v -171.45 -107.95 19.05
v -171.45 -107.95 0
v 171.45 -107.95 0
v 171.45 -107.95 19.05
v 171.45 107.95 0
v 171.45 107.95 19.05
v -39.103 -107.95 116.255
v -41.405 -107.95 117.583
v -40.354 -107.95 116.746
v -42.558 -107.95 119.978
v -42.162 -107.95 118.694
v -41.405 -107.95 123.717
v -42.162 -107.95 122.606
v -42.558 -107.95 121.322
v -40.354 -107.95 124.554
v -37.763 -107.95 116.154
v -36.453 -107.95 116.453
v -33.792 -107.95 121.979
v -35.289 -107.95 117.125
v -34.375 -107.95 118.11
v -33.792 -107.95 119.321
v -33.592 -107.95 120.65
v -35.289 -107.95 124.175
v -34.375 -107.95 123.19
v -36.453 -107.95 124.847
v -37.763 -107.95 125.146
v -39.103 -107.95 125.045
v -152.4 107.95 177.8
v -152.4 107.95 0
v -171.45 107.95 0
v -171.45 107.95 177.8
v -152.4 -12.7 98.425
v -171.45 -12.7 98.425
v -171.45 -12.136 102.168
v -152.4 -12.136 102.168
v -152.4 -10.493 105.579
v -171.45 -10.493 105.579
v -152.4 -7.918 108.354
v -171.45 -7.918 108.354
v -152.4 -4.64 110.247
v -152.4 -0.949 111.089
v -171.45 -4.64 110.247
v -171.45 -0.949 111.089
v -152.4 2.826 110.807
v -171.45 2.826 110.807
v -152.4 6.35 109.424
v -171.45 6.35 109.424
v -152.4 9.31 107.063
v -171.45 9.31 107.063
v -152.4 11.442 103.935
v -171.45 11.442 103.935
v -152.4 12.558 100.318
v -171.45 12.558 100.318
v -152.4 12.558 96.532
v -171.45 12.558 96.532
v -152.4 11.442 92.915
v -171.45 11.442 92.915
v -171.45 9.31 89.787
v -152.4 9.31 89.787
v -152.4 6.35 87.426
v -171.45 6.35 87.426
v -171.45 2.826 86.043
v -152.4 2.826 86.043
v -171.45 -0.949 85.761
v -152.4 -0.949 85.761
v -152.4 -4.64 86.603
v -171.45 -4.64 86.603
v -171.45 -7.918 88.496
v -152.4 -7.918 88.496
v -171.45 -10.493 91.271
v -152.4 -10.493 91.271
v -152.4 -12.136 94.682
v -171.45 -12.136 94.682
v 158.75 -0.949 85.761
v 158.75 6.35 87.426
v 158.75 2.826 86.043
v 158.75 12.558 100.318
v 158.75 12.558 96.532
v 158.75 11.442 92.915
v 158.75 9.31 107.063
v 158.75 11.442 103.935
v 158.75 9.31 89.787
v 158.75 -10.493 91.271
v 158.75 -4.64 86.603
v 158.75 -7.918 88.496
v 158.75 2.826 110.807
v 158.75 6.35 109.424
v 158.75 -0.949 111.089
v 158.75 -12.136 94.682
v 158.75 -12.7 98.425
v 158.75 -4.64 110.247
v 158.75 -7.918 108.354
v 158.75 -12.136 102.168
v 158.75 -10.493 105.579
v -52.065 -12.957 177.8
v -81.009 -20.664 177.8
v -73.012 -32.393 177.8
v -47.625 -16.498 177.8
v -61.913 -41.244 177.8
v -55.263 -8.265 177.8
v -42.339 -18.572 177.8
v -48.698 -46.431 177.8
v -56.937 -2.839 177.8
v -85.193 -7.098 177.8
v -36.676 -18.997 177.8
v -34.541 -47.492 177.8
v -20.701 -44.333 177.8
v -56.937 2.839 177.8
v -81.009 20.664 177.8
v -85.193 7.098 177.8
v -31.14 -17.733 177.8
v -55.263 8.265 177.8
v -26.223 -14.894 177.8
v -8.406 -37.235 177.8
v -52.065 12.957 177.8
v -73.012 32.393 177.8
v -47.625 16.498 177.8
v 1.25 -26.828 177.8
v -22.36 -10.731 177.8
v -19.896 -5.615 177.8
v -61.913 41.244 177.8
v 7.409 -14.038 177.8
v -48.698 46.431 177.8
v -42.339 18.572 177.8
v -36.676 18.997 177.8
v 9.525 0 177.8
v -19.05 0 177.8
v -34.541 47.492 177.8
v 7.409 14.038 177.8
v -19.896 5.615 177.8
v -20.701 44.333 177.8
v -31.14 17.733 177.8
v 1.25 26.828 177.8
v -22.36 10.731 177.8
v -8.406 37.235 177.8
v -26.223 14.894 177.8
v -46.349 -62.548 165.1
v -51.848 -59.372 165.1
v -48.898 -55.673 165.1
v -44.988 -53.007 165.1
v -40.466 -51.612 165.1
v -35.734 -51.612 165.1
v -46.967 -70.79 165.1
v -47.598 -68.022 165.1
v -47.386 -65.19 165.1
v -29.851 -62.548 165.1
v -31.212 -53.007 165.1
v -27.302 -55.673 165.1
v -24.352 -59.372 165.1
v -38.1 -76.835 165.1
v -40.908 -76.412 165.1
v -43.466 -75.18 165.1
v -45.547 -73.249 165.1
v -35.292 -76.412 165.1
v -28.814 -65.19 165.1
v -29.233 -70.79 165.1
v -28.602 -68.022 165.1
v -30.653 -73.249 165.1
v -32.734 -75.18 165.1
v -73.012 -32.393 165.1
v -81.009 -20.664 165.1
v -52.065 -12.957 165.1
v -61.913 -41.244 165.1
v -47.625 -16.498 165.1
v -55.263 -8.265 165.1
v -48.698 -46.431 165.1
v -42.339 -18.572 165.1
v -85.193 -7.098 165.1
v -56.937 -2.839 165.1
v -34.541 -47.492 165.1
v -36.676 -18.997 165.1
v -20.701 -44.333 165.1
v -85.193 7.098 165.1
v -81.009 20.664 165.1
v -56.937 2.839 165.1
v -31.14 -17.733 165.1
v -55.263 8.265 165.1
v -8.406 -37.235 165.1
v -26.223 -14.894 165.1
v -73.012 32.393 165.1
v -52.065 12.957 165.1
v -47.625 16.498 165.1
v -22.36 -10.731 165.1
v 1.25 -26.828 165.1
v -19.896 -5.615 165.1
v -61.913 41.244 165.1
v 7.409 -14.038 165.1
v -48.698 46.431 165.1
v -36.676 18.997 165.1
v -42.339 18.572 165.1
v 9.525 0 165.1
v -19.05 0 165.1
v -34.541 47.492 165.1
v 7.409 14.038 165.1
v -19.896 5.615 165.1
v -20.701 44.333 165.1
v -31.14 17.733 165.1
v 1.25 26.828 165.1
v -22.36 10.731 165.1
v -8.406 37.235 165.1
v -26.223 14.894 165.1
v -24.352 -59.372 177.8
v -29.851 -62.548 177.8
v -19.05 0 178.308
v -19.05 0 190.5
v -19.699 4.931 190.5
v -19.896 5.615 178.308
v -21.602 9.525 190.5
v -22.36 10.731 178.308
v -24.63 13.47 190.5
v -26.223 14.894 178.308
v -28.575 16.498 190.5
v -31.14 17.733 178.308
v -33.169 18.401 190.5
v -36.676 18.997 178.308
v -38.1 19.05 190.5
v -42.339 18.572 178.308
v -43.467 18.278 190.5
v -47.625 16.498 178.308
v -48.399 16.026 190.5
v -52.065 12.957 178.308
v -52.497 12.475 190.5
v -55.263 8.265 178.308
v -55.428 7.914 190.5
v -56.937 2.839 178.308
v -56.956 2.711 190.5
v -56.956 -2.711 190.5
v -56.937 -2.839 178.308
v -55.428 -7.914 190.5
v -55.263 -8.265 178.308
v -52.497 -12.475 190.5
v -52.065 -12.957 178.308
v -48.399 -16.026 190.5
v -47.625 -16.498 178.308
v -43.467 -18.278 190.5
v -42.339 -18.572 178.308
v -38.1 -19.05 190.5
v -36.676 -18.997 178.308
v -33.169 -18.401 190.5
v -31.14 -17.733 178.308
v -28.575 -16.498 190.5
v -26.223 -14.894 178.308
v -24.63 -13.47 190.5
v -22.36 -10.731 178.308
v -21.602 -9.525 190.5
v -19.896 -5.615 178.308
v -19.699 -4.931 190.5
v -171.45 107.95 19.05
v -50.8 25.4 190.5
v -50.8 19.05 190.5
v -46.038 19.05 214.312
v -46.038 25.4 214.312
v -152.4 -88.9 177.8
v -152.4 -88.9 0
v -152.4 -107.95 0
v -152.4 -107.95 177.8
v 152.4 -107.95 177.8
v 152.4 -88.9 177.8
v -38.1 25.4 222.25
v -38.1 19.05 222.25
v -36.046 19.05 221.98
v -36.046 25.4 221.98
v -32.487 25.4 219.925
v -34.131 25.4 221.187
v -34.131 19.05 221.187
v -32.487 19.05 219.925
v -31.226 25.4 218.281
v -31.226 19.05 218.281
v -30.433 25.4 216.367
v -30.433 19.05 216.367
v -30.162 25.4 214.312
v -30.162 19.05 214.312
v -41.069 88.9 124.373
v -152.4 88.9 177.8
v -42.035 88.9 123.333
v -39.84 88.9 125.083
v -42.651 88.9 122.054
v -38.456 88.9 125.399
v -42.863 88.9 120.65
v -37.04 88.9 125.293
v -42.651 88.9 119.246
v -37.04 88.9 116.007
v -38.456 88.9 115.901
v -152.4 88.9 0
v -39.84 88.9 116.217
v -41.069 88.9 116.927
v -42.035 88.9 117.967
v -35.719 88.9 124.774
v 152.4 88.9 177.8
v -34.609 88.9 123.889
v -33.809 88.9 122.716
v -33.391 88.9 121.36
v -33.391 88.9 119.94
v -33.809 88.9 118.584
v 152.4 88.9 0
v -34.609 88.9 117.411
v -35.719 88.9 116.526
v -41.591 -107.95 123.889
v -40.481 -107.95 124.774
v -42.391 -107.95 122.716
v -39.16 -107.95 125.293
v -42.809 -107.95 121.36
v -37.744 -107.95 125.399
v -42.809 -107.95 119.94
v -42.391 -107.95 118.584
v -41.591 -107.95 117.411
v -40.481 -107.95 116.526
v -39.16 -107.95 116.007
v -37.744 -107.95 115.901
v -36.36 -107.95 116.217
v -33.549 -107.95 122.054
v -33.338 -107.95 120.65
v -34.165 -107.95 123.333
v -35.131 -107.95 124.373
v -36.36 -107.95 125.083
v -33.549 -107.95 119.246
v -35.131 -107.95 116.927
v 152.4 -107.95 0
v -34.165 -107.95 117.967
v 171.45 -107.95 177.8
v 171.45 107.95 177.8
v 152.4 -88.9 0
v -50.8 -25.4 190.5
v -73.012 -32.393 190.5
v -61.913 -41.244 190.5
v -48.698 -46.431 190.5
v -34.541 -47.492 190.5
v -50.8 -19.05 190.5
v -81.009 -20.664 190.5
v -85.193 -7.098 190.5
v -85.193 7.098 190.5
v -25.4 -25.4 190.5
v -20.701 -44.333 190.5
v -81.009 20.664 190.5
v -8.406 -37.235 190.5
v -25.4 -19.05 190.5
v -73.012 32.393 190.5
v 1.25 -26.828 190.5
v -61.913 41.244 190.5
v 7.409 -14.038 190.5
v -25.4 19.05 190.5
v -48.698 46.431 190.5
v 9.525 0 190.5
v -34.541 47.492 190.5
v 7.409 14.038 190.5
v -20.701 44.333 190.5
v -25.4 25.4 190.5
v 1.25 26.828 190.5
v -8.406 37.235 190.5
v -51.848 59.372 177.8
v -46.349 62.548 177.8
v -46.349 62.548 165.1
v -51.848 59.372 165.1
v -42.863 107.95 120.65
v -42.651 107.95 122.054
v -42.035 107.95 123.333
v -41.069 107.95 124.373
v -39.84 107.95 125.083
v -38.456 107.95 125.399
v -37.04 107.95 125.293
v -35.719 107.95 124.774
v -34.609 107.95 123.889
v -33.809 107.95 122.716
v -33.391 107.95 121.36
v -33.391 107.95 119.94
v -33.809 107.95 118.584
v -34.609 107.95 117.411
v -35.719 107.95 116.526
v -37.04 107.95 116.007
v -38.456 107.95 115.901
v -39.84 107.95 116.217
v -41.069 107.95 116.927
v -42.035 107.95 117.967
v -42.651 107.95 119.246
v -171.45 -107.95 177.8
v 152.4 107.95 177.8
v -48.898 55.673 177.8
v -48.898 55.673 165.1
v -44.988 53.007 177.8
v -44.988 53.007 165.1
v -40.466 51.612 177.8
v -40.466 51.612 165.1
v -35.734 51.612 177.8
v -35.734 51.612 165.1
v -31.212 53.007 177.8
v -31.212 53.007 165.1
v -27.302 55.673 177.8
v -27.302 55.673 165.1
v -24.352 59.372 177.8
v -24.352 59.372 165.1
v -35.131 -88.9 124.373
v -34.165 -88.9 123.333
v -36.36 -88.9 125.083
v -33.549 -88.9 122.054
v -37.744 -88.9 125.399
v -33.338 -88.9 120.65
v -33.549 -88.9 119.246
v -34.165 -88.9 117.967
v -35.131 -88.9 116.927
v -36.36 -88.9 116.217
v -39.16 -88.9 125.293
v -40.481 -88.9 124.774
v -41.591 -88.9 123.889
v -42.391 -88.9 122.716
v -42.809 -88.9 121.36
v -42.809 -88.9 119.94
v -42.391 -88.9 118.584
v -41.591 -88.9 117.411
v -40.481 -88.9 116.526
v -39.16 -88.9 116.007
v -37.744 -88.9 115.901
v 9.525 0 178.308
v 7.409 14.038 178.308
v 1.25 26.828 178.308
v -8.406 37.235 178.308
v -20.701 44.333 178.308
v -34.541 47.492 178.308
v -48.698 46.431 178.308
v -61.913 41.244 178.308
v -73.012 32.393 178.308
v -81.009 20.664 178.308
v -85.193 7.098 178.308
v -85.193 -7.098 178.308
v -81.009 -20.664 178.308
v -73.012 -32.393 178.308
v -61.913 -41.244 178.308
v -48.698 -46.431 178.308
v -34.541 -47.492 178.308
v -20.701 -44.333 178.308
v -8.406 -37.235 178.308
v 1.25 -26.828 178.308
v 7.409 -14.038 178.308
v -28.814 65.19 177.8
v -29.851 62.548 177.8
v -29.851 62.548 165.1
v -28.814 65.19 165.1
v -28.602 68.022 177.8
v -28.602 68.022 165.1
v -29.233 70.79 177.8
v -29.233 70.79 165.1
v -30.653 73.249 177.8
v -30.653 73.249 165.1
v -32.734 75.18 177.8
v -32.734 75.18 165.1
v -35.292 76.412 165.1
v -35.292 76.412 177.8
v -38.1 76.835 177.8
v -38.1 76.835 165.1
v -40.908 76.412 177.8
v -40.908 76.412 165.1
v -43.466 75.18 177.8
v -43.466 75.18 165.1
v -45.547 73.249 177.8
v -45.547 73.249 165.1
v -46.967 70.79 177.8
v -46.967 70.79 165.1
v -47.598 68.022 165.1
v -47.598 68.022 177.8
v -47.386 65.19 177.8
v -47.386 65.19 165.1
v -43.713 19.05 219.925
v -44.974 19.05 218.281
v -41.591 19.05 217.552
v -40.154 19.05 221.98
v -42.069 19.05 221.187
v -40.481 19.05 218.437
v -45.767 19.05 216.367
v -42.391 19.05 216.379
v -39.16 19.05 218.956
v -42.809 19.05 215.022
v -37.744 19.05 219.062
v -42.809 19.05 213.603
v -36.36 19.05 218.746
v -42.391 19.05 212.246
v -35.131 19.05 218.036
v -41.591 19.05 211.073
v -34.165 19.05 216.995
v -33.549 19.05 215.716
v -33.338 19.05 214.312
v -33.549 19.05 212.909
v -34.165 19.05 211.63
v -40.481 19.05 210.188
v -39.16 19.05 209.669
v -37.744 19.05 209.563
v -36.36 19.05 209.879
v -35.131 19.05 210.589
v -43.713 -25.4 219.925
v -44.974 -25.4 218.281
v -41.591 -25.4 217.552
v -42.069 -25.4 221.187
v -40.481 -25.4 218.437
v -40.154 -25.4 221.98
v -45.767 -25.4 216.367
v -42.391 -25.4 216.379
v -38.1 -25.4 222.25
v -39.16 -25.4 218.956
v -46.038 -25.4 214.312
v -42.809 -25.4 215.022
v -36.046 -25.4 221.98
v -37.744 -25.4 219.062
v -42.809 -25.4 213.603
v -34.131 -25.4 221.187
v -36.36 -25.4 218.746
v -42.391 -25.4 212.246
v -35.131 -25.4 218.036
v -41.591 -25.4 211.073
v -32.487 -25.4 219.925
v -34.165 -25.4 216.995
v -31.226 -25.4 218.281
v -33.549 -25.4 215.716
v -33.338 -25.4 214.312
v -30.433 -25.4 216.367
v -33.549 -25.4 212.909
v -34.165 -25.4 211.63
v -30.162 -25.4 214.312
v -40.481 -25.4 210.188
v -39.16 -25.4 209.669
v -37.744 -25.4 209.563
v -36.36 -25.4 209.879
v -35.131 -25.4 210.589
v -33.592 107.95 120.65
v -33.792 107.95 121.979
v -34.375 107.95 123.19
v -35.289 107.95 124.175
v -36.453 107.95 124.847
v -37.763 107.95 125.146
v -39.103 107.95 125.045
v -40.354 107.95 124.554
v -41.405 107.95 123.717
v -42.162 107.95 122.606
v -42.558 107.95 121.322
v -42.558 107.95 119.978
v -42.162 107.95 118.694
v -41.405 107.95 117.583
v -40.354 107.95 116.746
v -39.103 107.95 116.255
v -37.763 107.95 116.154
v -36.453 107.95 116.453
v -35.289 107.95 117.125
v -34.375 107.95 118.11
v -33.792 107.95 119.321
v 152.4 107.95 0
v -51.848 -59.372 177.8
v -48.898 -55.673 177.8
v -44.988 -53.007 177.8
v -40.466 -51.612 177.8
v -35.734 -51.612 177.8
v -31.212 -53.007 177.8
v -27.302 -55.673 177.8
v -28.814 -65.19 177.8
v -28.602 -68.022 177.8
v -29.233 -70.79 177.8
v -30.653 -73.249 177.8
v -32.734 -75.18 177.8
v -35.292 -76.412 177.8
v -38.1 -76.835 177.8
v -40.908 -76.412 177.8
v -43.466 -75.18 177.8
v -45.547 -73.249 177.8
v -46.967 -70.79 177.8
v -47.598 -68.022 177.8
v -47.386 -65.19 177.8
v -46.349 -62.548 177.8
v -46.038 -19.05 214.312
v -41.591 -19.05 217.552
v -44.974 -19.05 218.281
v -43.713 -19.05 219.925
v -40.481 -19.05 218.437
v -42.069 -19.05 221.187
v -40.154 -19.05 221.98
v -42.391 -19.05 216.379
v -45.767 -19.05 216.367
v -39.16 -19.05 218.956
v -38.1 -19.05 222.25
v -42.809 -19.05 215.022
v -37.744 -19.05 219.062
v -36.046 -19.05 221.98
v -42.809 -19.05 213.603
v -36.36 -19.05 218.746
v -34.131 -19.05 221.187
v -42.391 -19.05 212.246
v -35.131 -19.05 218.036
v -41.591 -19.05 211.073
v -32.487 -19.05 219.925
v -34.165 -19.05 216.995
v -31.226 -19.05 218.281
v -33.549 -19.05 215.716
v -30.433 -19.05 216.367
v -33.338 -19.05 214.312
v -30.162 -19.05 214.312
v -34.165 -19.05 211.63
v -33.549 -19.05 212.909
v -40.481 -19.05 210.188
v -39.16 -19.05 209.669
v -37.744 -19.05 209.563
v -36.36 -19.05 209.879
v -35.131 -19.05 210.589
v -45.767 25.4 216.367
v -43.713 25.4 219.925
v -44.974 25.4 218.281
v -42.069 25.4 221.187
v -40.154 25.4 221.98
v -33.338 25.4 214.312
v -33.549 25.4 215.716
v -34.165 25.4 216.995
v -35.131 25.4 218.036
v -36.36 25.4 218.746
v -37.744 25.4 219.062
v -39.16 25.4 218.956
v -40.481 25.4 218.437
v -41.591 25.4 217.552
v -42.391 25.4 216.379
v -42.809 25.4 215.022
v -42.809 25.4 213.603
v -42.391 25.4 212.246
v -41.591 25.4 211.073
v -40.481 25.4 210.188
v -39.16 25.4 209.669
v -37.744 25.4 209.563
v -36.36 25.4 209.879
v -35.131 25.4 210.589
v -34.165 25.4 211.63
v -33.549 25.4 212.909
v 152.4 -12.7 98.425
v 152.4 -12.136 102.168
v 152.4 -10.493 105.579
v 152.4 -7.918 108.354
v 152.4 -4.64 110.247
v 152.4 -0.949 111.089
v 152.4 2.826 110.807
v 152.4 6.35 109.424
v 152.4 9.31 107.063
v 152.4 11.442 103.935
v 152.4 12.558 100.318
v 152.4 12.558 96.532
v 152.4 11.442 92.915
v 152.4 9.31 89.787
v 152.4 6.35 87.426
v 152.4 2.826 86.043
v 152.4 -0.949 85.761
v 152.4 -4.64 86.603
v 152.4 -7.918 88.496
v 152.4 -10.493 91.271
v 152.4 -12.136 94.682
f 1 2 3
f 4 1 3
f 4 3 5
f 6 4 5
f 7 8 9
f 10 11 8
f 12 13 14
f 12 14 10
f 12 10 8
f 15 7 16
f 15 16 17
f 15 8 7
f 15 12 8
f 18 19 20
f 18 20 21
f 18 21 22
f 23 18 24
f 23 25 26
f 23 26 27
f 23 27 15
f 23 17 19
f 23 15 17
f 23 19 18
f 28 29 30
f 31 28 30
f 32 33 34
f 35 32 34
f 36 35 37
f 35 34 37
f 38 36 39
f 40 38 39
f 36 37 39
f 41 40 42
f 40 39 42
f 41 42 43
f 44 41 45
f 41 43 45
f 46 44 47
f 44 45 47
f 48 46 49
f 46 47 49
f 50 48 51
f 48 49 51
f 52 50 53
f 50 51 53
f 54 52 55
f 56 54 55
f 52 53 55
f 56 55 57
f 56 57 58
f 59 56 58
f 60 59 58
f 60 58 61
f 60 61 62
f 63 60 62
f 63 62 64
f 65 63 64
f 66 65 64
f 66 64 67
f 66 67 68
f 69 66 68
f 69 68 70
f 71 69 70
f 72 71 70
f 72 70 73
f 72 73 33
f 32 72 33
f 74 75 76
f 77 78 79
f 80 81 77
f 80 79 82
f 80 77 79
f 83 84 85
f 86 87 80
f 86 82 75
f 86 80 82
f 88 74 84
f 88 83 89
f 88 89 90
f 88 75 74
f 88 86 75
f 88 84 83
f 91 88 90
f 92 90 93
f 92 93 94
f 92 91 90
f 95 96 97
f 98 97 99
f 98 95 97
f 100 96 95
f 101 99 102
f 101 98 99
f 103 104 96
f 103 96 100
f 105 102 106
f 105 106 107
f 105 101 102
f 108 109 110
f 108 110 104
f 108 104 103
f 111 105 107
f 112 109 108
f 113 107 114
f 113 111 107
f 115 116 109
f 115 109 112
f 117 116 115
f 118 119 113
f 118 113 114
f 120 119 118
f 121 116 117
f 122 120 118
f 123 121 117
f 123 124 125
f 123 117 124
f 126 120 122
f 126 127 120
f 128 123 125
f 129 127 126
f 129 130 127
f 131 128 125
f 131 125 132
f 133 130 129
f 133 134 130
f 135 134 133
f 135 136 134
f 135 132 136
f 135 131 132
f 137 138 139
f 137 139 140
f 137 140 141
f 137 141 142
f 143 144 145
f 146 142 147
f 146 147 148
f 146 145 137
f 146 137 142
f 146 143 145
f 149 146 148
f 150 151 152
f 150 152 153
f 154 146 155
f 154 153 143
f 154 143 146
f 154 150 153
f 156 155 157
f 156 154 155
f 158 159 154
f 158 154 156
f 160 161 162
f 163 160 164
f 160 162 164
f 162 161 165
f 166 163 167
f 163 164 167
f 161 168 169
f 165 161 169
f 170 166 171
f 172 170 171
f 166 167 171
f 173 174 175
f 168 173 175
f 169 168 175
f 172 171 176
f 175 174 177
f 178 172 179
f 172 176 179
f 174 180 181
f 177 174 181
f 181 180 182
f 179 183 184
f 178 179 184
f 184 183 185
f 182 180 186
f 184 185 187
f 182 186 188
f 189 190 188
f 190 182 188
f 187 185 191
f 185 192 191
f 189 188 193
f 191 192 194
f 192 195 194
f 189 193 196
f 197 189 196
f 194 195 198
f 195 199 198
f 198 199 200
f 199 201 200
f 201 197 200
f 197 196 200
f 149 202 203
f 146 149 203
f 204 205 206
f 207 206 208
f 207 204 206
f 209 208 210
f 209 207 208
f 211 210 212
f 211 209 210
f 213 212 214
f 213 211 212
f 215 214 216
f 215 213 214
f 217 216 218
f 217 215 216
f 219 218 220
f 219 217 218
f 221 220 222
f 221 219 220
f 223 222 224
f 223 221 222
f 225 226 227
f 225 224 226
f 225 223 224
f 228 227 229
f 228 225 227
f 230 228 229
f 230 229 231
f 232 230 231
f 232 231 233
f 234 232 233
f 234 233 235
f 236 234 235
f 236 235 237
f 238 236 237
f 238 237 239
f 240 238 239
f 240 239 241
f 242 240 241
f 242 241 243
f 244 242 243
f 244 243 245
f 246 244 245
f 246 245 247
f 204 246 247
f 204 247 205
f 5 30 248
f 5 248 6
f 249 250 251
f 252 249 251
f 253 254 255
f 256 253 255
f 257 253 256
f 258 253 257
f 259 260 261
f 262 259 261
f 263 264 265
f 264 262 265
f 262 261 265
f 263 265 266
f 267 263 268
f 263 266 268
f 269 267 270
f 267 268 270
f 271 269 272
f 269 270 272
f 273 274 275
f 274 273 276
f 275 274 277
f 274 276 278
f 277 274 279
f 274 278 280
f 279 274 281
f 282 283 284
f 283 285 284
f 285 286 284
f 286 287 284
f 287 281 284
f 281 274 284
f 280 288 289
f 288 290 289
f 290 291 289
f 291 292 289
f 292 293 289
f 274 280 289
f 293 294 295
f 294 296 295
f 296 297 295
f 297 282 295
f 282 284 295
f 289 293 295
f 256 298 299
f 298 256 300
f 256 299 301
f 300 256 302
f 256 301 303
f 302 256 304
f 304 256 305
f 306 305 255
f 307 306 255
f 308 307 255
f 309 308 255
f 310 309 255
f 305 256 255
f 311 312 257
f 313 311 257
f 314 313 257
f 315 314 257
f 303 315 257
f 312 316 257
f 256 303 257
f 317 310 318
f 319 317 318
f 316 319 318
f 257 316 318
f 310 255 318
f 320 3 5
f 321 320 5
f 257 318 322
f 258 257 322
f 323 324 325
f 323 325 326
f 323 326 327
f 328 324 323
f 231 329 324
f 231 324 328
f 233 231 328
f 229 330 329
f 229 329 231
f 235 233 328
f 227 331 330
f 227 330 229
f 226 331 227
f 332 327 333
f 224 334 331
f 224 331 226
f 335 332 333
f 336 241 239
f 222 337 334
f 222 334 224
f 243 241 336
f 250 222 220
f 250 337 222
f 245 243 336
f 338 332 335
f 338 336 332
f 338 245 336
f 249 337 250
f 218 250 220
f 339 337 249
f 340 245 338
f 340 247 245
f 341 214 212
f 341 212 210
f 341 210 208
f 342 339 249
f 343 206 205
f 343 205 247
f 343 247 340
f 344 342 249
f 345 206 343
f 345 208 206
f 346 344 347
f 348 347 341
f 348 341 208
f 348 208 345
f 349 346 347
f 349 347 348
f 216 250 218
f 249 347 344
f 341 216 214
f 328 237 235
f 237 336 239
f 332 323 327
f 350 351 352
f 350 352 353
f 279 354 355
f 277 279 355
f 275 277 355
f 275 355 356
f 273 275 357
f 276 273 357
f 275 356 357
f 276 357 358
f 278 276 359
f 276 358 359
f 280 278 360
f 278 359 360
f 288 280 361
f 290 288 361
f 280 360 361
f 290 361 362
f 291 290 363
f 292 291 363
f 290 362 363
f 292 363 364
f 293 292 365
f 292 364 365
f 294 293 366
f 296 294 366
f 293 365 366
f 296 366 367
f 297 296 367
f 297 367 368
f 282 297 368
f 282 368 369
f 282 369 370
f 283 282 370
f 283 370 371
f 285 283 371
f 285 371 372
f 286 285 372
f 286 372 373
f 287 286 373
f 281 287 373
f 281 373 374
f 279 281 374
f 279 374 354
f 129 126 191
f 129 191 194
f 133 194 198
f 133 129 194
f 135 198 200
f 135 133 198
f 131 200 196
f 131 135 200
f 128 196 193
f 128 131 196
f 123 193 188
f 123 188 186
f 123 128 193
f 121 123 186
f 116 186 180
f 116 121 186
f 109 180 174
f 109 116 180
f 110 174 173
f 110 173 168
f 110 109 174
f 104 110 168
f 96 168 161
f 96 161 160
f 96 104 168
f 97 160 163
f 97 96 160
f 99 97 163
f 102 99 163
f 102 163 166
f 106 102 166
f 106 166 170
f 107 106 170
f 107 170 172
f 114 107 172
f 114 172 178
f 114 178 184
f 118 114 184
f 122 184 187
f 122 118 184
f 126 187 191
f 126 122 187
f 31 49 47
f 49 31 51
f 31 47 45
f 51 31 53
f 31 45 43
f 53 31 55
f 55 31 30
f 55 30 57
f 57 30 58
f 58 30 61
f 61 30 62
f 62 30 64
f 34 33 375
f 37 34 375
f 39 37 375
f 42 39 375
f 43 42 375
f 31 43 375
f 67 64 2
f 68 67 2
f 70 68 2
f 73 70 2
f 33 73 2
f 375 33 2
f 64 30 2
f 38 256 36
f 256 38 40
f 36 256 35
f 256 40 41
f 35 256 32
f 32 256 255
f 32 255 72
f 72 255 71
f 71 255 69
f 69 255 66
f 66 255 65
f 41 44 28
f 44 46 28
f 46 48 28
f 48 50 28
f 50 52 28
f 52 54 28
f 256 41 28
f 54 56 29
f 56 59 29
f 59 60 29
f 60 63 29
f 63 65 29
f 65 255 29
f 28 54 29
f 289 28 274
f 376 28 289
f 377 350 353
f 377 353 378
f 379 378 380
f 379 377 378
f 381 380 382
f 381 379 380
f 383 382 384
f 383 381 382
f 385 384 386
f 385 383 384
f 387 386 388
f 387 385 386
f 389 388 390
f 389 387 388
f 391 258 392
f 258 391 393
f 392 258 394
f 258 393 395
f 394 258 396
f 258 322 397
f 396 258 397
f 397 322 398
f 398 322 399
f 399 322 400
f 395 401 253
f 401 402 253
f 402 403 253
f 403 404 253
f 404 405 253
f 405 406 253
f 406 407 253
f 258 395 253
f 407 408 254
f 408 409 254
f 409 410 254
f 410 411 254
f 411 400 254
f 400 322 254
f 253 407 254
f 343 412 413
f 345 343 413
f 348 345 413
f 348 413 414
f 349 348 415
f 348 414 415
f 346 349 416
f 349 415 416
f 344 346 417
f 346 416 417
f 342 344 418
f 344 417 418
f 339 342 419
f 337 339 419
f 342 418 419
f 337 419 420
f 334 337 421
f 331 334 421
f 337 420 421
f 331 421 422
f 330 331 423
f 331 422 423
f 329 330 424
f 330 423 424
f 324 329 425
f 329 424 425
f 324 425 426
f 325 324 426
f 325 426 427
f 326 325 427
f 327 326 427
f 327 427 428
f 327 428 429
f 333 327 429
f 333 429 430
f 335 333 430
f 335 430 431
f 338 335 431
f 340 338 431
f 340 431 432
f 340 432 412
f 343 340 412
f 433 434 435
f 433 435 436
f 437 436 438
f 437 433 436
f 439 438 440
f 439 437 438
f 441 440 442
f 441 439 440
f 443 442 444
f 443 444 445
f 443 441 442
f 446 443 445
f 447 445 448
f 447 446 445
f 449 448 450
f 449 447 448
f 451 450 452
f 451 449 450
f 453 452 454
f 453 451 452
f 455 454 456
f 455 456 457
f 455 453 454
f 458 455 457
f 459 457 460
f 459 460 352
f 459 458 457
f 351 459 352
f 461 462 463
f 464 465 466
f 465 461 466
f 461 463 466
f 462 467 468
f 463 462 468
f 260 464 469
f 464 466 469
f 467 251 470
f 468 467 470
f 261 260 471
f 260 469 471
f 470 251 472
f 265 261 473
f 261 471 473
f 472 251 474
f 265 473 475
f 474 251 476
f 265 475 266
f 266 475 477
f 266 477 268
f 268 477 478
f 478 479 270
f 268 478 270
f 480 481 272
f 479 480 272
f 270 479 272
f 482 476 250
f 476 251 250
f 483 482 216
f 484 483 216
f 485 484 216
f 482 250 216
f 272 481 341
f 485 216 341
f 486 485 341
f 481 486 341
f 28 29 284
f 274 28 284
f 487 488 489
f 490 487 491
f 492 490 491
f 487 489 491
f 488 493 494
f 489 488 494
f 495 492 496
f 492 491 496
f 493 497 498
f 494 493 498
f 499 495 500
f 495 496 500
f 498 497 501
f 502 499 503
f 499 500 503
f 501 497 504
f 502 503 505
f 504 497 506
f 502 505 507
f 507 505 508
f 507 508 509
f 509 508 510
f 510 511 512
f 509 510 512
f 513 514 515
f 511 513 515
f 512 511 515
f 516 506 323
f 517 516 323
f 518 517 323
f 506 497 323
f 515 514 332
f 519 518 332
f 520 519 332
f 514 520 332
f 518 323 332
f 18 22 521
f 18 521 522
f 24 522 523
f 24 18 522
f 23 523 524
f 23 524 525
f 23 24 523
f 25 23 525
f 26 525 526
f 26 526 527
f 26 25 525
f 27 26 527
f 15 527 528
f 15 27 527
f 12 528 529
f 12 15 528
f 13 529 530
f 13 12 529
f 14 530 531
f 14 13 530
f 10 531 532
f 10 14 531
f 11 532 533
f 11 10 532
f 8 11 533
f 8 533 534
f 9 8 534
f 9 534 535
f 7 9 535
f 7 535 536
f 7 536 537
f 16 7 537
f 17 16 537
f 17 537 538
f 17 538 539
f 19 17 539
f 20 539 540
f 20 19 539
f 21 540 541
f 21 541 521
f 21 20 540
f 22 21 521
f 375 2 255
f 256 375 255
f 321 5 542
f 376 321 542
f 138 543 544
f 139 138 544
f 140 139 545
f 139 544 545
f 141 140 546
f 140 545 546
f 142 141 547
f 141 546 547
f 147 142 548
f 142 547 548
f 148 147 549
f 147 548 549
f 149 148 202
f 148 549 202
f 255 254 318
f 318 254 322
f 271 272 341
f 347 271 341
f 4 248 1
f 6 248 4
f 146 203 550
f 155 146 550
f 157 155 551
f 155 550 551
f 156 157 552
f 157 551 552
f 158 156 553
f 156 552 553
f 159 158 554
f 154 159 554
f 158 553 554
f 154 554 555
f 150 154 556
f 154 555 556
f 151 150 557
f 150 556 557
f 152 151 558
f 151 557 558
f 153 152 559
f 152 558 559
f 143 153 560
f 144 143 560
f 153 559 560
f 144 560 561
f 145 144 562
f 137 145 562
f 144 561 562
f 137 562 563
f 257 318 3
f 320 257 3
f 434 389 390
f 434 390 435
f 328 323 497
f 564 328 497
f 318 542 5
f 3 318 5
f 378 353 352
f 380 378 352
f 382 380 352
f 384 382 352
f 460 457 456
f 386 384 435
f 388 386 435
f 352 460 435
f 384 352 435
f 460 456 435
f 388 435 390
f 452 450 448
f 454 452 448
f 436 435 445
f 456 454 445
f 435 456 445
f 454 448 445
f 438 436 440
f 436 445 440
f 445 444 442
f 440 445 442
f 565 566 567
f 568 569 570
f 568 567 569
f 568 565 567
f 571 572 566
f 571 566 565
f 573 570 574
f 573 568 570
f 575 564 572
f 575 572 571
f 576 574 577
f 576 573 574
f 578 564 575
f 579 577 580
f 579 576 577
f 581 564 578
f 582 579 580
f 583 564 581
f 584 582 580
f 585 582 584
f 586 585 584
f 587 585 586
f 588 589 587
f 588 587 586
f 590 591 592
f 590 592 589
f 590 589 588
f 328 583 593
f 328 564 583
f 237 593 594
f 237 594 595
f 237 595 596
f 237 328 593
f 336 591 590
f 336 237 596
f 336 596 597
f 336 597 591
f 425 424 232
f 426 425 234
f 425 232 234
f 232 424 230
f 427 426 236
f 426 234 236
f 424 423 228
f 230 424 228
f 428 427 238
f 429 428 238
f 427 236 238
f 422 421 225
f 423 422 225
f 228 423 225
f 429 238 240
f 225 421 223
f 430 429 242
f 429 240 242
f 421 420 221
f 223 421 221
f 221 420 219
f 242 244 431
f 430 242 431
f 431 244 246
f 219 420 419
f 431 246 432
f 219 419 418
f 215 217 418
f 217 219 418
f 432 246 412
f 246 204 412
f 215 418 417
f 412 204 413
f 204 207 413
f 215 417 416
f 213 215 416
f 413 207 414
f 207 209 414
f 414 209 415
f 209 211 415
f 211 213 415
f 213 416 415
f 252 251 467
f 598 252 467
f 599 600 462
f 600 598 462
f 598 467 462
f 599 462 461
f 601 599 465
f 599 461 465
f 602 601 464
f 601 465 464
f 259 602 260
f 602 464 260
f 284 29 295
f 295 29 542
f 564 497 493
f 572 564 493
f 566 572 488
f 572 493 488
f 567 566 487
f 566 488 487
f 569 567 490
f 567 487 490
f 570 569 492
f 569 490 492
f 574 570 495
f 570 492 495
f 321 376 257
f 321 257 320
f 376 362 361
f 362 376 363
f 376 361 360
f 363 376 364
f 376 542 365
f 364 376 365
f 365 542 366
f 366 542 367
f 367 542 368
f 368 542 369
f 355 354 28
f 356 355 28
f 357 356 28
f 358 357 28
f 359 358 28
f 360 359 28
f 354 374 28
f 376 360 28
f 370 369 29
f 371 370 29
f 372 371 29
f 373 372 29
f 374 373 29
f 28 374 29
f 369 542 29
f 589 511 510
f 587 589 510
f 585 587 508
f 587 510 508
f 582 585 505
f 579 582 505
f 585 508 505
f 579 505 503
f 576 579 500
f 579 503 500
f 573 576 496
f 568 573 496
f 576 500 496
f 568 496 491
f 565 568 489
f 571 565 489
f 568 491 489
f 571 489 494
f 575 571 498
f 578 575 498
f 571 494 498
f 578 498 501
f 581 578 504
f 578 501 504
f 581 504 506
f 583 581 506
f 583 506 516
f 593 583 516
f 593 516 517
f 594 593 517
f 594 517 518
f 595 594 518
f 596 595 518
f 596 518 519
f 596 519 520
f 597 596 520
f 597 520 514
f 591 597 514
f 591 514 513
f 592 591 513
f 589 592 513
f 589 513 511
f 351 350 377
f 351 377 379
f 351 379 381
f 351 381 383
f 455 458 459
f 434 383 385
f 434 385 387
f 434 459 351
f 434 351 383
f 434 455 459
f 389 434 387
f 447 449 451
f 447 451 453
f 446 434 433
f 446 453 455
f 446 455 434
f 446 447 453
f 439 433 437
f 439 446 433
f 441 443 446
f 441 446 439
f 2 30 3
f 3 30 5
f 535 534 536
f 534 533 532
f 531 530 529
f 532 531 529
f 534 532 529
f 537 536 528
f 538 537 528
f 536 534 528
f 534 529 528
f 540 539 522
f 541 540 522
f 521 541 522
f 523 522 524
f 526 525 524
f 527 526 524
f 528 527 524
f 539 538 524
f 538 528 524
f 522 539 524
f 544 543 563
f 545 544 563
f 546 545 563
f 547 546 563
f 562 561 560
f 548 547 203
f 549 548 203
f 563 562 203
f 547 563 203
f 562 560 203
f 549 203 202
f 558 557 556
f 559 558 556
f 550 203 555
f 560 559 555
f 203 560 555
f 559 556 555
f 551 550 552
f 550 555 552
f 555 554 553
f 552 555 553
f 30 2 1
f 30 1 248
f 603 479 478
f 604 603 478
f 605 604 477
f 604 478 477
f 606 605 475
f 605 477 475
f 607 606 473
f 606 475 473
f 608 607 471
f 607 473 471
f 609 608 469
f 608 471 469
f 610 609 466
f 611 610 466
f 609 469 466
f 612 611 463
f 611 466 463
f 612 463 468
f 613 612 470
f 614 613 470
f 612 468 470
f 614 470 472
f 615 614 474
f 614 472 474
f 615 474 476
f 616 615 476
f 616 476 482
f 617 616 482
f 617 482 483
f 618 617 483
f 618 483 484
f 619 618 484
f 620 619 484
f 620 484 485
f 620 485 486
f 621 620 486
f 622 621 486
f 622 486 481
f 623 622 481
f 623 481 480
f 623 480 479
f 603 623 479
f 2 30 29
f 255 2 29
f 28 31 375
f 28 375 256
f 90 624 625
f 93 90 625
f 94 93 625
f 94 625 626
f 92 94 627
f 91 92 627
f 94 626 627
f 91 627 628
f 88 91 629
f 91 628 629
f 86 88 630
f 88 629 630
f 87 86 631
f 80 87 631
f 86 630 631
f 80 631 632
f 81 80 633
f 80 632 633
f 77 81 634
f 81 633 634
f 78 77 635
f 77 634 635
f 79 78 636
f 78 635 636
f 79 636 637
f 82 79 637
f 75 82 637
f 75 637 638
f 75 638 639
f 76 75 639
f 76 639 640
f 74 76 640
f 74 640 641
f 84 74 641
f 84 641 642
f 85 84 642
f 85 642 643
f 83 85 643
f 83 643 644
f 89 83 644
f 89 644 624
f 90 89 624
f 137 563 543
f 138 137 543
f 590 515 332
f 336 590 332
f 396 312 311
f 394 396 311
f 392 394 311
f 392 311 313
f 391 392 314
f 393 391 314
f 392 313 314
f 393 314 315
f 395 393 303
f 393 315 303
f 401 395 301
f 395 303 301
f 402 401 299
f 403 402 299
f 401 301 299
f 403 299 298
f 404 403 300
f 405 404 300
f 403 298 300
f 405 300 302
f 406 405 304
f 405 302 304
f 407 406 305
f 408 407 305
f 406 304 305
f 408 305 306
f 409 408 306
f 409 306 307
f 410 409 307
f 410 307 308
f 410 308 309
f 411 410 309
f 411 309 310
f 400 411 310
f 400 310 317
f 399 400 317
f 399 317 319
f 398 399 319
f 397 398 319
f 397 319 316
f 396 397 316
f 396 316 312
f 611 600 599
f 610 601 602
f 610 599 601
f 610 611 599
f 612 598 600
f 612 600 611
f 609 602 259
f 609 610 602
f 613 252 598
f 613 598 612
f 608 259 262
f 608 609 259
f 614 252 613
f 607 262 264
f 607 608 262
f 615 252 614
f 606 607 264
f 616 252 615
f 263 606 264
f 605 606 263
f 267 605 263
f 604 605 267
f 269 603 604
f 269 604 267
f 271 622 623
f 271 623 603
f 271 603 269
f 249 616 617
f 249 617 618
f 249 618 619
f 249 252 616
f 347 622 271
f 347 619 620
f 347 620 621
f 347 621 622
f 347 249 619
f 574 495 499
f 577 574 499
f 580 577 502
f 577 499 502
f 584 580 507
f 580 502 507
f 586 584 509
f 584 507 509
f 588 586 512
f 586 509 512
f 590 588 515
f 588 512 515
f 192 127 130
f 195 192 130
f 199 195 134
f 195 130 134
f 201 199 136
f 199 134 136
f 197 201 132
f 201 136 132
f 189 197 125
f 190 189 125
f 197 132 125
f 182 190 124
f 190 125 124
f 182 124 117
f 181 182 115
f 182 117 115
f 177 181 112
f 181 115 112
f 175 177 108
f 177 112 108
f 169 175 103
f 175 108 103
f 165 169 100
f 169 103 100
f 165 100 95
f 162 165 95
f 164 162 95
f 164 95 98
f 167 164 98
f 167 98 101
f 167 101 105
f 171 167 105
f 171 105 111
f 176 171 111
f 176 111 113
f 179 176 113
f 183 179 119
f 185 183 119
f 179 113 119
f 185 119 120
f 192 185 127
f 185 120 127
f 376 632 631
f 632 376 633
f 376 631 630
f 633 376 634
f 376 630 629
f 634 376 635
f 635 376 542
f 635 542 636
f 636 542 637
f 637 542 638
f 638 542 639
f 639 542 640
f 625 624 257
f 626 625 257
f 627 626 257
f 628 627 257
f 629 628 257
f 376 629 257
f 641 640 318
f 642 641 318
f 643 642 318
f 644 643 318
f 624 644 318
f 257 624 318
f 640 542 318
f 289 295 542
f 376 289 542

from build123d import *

# Parameters (mm, degrees)
F1_DEPTH  = 177.8
F2_DEPTH  = 177.8
F3_DEPTH  = 177.8
F4_DEPTH  = 177.8
F5_W      = 342.9
F5_H      = 215.9
F6_DEPTH  = 19.05
F7_R      = 12.7
F8_DEPTH  = 330.2
F10_R     = 47.625
F10_R_2   = 19.05
F11_DEPTH = 12.7
F12_R     = 4.7625
F13_DEPTH = 206.375
F14_R     = 4.7625
F15_DEPTH = 25.4
F16_R     = 4.5085
F17_DEPTH = 215.9
F19_DEPTH = 12.7
F21_START = 0.508
F21_DEPTH = 12.192
F22_W     = 25.4
F22_H     = 6.35
F23_DEPTH = 31.75
F24_R     = 4.7625
F25_DEPTH = 127


with BuildPart() as f1:
    # F0 (on Top) → F1 (new body)
    with BuildSketch(Plane.XY):
        Polygon((-152.4, 0), (-152.4, 88.9), (-152.4, 107.95), (-171.45, 107.95), (-171.45, 0), (-171.45, -107.95), (-152.4, -107.95), (-152.4, -88.9), align=None)
    extrude(amount=F1_DEPTH)


with BuildPart() as f2:
    # F0 (on Top) → F2 (new body)
    with BuildSketch(Plane.XY):
        Polygon((152.4, 107.95), (152.4, 88.9), (152.4, 0), (152.4, -88.9), (152.4, -107.95), (171.45, -107.95), (171.45, 107.95), align=None)
    extrude(amount=F2_DEPTH)


with BuildPart() as f3:
    # F0 (on Top) → F3 (new body)
    with BuildSketch(Plane.XY):
        Polygon((-152.4, 107.95), (-152.4, 88.9), (0, 88.9), (152.4, 88.9), (152.4, 107.95), align=None)
    extrude(amount=F3_DEPTH)

    # F14 (on face) → F15 (cut)
    with BuildSketch(Plane(origin=(0, 107.95, 0), x_dir=(-1, 0, 0), z_dir=(0, 1, 0))):
        with Locations((38.1, 120.65)):
            Circle(F14_R)
    extrude(amount=-F15_DEPTH, mode=Mode.SUBTRACT)


with BuildPart() as f4:
    # F0 (on Top) → F4 (new body)
    with BuildSketch(Plane.XY):
        Polygon((152.4, -88.9), (0, -88.9), (-152.4, -88.9), (-152.4, -107.95), (152.4, -107.95), align=None)
    extrude(amount=F4_DEPTH)

    # F12 (on face) → F13 (cut)
    with BuildSketch(Plane.XZ.offset(107.95)):
        with Locations((-38.1, 120.65)):
            Circle(F12_R)
    extrude(amount=-F13_DEPTH, mode=Mode.SUBTRACT)


with BuildPart() as f6:
    # F5 (on Top) → F6 (new body)
    with BuildSketch(Plane.XY):
        Rectangle(F5_W, F5_H)
    extrude(amount=F6_DEPTH)


with BuildPart() as f8_tool:
    # F7 (on face) → F8 (new body)
    with BuildSketch(Plane(origin=(-171.45, 0, 0), x_dir=(0, -1, 0), z_dir=(-1, 0, 0))):
        with Locations((0, 98.425)):
            Circle(F7_R)
    extrude(amount=-F8_DEPTH)


with BuildPart() as f1_1:
    add(f1.part)

    # F8: cut by f8_tool
    add(f8_tool.part, mode=Mode.SUBTRACT)


with BuildPart() as f2_1:
    add(f2.part)

    # F8: cut by f8_tool
    add(f8_tool.part, mode=Mode.SUBTRACT)


with BuildPart() as f11:
    # F10 (on face) → F11 (new body)
    with BuildSketch(Plane.XY.offset(177.8)):
        with Locations((-38.1, 0)):
            Circle(F10_R)
        with Locations((-38.1, 0)):
            Circle(F10_R_2, mode=Mode.SUBTRACT)
    extrude(amount=-F11_DEPTH)


with BuildPart() as f17:
    # F16 (on face) → F17 (new body)
    with BuildSketch(Plane.XZ.offset(107.95)):
        with Locations((-38.1, 120.65)):
            Circle(F16_R)
    extrude(amount=-F17_DEPTH)


with BuildPart() as f19:
    # F18 (on face) → F19 (new body)
    with BuildSketch(Plane.XY.offset(177.8)):
        with BuildLine():
            Line((-46.348891971, 62.5475), (-51.8481532851, 59.3725))
            ThreePointArc((-51.8481532851, 59.3725), (-38.1, 51.435), (-24.3518467149, 59.3725))
            Line((-24.3518467149, 59.3725), (-29.851108029, 62.5475))
            ThreePointArc((-29.851108029, 62.5475), (-38.1, 76.835), (-46.348891971, 62.5475))
        make_face()
    extrude(amount=-F19_DEPTH)


with BuildPart() as f20_1:
    # F20: instance of F19
    add(f19.part.mirror(Plane.XZ))


with BuildPart() as f21:
    # F10 (on face) → F21 (new body)
    with BuildSketch(Plane.XY.offset(177.8).offset(F21_START)):
        with Locations((-38.1, 0)):
            Circle(F10_R)
        with Locations((-38.1, 0)):
            Circle(F10_R_2, mode=Mode.SUBTRACT)
    extrude(amount=F21_DEPTH)

    # F22 (on face) → F23 (join)
    with BuildSketch(Plane.XY.offset(190.5)):
        with Locations((-38.1, 22.225)):
            Rectangle(F22_W, F22_H)
        with Locations((-38.1, -22.225)):
            Rectangle(F22_W, F22_H)
    extrude(amount=F23_DEPTH)

    # F24 (on face) → F25 (cut)
    with BuildSketch(Plane.XZ.offset(25.4)):
        with BuildLine():
            ThreePointArc((-38.1, 222.25), (-32.4873399243, 219.9251600757), (-30.1625, 214.3125))
            Line((-30.1625, 214.3125), (-25.4, 190.5))
            Line((-25.4, 190.5), (-25.4, 222.25))
            Line((-25.4, 222.25), (-38.1, 222.25))
        make_face()
        with Locations((-38.1, 214.3125)):
            Circle(F24_R)
        with BuildLine():
            ThreePointArc((-46.0375, 214.3125), (-43.7126600757, 219.9251600757), (-38.1, 222.25))
            Line((-38.1, 222.25), (-50.8, 222.25))
            Line((-50.8, 222.25), (-50.8, 190.5))
            Line((-50.8, 190.5), (-46.0375, 214.3125))
        make_face()
    extrude(amount=-F25_DEPTH, mode=Mode.SUBTRACT)


solid = Compound([f3.part, f4.part, f6.part, f1_1.part, f2_1.part, f11.part, f17.part, f19.part, f20_1.part, f21.part])
